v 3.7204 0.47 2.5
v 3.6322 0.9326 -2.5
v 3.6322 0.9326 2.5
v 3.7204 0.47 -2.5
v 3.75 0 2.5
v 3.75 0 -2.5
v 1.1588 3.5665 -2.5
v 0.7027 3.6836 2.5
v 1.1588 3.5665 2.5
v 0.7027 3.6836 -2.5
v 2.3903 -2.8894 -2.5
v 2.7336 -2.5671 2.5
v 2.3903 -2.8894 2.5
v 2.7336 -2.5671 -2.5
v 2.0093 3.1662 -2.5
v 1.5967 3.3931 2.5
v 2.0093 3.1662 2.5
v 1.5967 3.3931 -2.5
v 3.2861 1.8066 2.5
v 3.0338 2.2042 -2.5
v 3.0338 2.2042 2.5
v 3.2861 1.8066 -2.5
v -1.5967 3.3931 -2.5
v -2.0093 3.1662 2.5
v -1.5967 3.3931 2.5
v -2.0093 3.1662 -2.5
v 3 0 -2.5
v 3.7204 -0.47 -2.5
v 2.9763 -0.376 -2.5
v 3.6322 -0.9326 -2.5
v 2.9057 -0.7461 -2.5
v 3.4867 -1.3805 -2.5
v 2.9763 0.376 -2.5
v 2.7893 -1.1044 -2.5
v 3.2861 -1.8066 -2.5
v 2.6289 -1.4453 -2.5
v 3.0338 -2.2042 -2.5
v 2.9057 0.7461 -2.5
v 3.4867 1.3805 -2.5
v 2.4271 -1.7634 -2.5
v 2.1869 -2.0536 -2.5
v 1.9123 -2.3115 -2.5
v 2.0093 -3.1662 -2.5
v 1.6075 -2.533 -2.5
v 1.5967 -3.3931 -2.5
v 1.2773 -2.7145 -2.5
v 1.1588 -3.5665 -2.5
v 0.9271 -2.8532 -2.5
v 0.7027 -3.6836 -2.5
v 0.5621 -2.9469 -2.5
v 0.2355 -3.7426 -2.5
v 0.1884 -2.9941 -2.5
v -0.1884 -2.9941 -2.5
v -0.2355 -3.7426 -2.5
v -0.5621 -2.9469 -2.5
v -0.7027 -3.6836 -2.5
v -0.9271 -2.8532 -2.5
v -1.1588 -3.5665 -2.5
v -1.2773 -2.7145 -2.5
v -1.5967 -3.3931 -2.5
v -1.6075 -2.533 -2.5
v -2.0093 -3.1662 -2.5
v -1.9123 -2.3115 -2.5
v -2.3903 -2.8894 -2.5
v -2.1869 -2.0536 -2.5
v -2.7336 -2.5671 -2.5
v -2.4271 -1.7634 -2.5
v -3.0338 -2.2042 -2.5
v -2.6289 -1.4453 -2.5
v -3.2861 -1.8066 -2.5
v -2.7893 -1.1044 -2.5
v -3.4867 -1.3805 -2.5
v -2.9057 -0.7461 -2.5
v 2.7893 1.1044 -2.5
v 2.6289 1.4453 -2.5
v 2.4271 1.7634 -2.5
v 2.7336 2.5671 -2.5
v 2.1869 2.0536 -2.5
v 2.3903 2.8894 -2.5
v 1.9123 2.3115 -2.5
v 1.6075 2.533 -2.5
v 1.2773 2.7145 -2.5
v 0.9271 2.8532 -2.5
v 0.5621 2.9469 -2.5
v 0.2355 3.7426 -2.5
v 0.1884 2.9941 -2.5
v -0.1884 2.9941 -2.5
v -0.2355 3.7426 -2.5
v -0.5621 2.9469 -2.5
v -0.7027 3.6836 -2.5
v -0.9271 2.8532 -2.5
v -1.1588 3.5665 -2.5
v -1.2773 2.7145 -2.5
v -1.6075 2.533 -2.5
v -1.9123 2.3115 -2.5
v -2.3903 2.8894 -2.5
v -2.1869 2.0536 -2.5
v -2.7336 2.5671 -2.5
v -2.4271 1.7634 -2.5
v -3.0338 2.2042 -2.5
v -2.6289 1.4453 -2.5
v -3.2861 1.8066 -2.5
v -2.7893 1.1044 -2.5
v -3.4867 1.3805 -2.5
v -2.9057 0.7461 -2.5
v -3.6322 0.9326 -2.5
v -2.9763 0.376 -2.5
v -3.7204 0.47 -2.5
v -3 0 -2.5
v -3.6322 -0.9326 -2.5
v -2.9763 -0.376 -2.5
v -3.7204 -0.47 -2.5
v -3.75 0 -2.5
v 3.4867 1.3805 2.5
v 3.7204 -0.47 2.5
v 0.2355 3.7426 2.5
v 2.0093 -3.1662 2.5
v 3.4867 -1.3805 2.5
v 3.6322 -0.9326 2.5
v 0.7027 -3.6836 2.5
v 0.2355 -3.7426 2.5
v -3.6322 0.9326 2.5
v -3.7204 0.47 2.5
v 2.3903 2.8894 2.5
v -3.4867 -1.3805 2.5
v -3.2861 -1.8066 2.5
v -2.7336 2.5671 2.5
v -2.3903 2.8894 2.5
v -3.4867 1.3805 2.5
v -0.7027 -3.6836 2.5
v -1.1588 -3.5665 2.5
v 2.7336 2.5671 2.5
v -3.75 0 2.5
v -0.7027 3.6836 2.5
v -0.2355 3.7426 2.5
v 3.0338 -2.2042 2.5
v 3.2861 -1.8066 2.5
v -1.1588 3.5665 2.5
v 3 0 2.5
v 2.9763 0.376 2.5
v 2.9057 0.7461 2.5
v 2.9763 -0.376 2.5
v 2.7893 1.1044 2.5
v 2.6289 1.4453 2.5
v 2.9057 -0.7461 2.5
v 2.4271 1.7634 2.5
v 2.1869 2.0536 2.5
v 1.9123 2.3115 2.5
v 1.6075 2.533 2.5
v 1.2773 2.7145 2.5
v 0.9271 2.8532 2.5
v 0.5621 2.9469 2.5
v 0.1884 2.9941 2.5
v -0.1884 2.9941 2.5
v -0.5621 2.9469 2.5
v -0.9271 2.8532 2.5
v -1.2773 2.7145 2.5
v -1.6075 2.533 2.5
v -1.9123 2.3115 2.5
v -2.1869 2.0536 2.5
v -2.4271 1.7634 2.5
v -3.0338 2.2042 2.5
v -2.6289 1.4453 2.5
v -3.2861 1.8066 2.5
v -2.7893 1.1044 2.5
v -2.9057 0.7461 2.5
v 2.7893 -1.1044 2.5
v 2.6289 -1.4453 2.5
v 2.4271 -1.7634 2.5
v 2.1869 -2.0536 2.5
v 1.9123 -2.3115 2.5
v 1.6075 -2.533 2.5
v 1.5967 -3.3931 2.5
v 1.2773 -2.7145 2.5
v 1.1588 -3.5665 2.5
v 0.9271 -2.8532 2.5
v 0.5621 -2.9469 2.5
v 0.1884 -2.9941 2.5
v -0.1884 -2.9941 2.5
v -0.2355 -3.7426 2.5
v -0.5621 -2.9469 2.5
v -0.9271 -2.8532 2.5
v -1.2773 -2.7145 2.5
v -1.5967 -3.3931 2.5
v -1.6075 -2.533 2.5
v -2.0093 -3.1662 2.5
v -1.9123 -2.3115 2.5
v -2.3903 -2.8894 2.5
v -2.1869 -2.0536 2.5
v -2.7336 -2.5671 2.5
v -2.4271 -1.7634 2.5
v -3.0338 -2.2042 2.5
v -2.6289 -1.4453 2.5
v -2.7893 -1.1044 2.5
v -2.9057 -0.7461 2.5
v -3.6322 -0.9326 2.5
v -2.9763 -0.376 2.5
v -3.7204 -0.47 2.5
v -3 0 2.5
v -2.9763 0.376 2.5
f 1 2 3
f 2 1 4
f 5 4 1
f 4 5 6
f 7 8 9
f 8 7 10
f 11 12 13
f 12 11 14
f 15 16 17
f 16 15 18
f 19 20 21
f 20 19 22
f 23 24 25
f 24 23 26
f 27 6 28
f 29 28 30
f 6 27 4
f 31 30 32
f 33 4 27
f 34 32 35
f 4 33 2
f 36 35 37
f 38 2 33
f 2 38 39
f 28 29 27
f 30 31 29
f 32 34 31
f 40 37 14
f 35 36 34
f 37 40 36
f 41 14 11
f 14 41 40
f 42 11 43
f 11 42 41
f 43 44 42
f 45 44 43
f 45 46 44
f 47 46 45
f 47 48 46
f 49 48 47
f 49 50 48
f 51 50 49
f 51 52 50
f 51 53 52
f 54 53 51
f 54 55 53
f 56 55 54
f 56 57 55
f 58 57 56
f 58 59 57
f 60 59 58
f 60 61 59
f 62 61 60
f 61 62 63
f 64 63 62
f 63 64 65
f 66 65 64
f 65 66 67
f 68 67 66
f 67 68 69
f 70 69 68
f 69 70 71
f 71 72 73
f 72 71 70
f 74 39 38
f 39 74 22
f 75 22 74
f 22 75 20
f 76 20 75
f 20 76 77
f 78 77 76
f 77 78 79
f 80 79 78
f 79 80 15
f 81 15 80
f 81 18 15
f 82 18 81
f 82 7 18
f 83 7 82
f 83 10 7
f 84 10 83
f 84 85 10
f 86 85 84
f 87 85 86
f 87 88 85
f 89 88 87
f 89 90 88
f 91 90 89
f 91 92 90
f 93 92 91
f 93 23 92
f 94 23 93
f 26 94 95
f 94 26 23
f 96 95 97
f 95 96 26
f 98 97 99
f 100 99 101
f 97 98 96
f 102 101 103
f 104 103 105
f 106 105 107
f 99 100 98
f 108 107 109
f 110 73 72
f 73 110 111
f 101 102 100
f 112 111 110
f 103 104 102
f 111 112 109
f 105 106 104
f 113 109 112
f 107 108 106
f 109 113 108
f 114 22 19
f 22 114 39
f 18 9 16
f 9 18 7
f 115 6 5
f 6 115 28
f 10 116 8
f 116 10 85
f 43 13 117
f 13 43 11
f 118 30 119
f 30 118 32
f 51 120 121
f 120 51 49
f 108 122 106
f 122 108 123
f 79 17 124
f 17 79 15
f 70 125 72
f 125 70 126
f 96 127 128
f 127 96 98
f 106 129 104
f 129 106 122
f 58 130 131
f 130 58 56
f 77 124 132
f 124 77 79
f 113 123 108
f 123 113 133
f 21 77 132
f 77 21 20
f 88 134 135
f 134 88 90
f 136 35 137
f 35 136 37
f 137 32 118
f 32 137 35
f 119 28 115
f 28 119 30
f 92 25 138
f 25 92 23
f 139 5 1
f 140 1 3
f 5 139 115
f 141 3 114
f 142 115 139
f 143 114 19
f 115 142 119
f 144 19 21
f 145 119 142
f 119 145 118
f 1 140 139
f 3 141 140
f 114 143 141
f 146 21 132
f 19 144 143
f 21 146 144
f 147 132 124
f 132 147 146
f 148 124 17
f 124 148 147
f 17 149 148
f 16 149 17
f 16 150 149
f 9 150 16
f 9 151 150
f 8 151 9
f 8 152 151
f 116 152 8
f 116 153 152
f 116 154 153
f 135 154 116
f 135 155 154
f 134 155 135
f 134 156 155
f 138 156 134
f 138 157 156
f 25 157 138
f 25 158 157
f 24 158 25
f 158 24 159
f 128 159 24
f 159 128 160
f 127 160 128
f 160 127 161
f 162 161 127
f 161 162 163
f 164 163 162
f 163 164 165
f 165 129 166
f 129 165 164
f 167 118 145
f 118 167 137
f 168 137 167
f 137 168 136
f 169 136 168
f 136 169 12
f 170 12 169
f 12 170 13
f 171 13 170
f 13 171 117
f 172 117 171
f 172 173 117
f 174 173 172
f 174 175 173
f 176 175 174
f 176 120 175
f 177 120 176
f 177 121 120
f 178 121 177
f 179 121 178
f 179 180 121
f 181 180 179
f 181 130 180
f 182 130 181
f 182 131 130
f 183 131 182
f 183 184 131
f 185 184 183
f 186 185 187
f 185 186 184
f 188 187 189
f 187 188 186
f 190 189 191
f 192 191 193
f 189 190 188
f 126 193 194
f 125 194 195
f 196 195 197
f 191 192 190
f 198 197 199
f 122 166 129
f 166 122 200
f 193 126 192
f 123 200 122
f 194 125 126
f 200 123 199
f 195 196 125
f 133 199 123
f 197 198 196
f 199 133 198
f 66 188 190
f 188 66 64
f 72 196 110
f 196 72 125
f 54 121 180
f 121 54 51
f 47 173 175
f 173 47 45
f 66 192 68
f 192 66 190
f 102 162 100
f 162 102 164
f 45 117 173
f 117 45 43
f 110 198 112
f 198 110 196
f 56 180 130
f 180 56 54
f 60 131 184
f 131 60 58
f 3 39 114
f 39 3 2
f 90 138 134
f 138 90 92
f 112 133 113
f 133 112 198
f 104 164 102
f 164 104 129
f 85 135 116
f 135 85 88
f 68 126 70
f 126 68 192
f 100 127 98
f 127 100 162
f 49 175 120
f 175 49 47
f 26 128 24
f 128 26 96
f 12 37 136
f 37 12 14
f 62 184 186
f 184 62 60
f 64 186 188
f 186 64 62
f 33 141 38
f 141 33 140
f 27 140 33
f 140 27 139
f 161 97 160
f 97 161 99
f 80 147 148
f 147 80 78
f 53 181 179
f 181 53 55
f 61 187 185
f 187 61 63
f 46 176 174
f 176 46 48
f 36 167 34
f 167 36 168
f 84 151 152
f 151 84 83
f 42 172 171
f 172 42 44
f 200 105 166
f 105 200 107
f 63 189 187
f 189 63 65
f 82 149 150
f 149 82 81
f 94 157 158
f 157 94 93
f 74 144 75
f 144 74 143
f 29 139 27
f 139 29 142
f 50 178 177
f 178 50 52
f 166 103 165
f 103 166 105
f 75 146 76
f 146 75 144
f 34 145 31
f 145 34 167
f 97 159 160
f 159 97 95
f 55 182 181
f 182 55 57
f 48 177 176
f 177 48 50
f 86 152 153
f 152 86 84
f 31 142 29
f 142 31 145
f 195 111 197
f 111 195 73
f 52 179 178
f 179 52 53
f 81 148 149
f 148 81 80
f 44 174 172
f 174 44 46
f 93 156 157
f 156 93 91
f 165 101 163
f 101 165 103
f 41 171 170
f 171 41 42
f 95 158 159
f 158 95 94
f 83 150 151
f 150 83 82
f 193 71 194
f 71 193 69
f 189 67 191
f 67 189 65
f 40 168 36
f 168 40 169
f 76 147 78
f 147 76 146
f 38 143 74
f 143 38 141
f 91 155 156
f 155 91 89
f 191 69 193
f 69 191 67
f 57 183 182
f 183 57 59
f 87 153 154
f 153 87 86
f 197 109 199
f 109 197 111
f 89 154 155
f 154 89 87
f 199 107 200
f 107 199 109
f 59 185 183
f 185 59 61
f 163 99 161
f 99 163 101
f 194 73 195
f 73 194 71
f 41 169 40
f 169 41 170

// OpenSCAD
$fn = 50;


difference() {
	union() {
		translate(v = [0, 0, -2.5000000000]) {
			cylinder(h = 5, r = 3.7500000000);
		}
	}
	union() {
		translate(v = [0, 0, -100.0000000000]) {
			cylinder(h = 200, r = 3.0000000000);
		}
	}
}
